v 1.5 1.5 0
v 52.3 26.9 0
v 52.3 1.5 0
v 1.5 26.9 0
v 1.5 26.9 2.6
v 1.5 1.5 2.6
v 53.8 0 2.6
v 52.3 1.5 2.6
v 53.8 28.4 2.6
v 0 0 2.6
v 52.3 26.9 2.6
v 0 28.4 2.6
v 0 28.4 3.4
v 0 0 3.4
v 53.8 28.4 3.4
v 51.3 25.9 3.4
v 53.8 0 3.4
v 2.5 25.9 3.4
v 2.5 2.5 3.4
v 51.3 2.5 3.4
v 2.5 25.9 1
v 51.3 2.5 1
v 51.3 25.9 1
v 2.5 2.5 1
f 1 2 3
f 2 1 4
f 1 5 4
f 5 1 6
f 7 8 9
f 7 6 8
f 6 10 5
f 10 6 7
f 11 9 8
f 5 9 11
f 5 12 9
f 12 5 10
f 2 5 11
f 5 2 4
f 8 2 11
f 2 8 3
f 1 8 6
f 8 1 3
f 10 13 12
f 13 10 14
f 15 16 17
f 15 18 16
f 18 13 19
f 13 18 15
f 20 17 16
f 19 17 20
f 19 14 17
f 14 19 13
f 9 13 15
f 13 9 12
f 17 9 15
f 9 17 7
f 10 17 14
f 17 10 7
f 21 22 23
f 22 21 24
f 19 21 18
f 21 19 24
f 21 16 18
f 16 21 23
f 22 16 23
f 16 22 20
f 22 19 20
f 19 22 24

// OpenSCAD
// Cleaver rev0.9: replaceable badge, millimetres, face down.
// Render "blank" for a translucent insert. For two-colour printing, export
// "mask" and "diffuser" separately and load them together at the SAME origin.
// Edit mark() or import a centred SVG inside the 47.8 x 22.4 mm design area.
// The 53.8 x 28.4 mm flange and 50.8 x 25.4 mm body are the mechanical interface.
part = "blank"; // [blank,mask,diffuser]
face = [50.8, 25.4];
flange = [53.8, 28.4];
bore = [48.8, 23.4];
flange_z = 2.60000;
flange_thickness = 0.8;
diffuser_thickness = 1.0;
mask_thickness = 0.4;

module sq(size) { square(size,center=true); }
module mark() { text("C",size=18,halign="center",valign="center",font="Liberation Sans:style=Bold"); }
module blank() {
    difference() {
        union() {
            linear_extrude(flange_z) sq(face);
            translate([0,0,flange_z]) linear_extrude(flange_thickness) sq(flange);
        }
        translate([0,0,diffuser_thickness])
            linear_extrude(flange_z+flange_thickness) sq(bore);
    }
}
module mask() {
    linear_extrude(mask_thickness)
        difference() { sq(face); intersection() { sq(bore-[1,1]); mirror([0,1,0]) mark(); } }
}
// The Y mirror keeps lettering readable after turning the face-down print over.
translate([flange[0]/2,flange[1]/2,0]) {
    if (part == "blank") blank();
    else if (part == "mask") mask();
    else if (part == "diffuser") difference() { blank(); mask(); }
}
